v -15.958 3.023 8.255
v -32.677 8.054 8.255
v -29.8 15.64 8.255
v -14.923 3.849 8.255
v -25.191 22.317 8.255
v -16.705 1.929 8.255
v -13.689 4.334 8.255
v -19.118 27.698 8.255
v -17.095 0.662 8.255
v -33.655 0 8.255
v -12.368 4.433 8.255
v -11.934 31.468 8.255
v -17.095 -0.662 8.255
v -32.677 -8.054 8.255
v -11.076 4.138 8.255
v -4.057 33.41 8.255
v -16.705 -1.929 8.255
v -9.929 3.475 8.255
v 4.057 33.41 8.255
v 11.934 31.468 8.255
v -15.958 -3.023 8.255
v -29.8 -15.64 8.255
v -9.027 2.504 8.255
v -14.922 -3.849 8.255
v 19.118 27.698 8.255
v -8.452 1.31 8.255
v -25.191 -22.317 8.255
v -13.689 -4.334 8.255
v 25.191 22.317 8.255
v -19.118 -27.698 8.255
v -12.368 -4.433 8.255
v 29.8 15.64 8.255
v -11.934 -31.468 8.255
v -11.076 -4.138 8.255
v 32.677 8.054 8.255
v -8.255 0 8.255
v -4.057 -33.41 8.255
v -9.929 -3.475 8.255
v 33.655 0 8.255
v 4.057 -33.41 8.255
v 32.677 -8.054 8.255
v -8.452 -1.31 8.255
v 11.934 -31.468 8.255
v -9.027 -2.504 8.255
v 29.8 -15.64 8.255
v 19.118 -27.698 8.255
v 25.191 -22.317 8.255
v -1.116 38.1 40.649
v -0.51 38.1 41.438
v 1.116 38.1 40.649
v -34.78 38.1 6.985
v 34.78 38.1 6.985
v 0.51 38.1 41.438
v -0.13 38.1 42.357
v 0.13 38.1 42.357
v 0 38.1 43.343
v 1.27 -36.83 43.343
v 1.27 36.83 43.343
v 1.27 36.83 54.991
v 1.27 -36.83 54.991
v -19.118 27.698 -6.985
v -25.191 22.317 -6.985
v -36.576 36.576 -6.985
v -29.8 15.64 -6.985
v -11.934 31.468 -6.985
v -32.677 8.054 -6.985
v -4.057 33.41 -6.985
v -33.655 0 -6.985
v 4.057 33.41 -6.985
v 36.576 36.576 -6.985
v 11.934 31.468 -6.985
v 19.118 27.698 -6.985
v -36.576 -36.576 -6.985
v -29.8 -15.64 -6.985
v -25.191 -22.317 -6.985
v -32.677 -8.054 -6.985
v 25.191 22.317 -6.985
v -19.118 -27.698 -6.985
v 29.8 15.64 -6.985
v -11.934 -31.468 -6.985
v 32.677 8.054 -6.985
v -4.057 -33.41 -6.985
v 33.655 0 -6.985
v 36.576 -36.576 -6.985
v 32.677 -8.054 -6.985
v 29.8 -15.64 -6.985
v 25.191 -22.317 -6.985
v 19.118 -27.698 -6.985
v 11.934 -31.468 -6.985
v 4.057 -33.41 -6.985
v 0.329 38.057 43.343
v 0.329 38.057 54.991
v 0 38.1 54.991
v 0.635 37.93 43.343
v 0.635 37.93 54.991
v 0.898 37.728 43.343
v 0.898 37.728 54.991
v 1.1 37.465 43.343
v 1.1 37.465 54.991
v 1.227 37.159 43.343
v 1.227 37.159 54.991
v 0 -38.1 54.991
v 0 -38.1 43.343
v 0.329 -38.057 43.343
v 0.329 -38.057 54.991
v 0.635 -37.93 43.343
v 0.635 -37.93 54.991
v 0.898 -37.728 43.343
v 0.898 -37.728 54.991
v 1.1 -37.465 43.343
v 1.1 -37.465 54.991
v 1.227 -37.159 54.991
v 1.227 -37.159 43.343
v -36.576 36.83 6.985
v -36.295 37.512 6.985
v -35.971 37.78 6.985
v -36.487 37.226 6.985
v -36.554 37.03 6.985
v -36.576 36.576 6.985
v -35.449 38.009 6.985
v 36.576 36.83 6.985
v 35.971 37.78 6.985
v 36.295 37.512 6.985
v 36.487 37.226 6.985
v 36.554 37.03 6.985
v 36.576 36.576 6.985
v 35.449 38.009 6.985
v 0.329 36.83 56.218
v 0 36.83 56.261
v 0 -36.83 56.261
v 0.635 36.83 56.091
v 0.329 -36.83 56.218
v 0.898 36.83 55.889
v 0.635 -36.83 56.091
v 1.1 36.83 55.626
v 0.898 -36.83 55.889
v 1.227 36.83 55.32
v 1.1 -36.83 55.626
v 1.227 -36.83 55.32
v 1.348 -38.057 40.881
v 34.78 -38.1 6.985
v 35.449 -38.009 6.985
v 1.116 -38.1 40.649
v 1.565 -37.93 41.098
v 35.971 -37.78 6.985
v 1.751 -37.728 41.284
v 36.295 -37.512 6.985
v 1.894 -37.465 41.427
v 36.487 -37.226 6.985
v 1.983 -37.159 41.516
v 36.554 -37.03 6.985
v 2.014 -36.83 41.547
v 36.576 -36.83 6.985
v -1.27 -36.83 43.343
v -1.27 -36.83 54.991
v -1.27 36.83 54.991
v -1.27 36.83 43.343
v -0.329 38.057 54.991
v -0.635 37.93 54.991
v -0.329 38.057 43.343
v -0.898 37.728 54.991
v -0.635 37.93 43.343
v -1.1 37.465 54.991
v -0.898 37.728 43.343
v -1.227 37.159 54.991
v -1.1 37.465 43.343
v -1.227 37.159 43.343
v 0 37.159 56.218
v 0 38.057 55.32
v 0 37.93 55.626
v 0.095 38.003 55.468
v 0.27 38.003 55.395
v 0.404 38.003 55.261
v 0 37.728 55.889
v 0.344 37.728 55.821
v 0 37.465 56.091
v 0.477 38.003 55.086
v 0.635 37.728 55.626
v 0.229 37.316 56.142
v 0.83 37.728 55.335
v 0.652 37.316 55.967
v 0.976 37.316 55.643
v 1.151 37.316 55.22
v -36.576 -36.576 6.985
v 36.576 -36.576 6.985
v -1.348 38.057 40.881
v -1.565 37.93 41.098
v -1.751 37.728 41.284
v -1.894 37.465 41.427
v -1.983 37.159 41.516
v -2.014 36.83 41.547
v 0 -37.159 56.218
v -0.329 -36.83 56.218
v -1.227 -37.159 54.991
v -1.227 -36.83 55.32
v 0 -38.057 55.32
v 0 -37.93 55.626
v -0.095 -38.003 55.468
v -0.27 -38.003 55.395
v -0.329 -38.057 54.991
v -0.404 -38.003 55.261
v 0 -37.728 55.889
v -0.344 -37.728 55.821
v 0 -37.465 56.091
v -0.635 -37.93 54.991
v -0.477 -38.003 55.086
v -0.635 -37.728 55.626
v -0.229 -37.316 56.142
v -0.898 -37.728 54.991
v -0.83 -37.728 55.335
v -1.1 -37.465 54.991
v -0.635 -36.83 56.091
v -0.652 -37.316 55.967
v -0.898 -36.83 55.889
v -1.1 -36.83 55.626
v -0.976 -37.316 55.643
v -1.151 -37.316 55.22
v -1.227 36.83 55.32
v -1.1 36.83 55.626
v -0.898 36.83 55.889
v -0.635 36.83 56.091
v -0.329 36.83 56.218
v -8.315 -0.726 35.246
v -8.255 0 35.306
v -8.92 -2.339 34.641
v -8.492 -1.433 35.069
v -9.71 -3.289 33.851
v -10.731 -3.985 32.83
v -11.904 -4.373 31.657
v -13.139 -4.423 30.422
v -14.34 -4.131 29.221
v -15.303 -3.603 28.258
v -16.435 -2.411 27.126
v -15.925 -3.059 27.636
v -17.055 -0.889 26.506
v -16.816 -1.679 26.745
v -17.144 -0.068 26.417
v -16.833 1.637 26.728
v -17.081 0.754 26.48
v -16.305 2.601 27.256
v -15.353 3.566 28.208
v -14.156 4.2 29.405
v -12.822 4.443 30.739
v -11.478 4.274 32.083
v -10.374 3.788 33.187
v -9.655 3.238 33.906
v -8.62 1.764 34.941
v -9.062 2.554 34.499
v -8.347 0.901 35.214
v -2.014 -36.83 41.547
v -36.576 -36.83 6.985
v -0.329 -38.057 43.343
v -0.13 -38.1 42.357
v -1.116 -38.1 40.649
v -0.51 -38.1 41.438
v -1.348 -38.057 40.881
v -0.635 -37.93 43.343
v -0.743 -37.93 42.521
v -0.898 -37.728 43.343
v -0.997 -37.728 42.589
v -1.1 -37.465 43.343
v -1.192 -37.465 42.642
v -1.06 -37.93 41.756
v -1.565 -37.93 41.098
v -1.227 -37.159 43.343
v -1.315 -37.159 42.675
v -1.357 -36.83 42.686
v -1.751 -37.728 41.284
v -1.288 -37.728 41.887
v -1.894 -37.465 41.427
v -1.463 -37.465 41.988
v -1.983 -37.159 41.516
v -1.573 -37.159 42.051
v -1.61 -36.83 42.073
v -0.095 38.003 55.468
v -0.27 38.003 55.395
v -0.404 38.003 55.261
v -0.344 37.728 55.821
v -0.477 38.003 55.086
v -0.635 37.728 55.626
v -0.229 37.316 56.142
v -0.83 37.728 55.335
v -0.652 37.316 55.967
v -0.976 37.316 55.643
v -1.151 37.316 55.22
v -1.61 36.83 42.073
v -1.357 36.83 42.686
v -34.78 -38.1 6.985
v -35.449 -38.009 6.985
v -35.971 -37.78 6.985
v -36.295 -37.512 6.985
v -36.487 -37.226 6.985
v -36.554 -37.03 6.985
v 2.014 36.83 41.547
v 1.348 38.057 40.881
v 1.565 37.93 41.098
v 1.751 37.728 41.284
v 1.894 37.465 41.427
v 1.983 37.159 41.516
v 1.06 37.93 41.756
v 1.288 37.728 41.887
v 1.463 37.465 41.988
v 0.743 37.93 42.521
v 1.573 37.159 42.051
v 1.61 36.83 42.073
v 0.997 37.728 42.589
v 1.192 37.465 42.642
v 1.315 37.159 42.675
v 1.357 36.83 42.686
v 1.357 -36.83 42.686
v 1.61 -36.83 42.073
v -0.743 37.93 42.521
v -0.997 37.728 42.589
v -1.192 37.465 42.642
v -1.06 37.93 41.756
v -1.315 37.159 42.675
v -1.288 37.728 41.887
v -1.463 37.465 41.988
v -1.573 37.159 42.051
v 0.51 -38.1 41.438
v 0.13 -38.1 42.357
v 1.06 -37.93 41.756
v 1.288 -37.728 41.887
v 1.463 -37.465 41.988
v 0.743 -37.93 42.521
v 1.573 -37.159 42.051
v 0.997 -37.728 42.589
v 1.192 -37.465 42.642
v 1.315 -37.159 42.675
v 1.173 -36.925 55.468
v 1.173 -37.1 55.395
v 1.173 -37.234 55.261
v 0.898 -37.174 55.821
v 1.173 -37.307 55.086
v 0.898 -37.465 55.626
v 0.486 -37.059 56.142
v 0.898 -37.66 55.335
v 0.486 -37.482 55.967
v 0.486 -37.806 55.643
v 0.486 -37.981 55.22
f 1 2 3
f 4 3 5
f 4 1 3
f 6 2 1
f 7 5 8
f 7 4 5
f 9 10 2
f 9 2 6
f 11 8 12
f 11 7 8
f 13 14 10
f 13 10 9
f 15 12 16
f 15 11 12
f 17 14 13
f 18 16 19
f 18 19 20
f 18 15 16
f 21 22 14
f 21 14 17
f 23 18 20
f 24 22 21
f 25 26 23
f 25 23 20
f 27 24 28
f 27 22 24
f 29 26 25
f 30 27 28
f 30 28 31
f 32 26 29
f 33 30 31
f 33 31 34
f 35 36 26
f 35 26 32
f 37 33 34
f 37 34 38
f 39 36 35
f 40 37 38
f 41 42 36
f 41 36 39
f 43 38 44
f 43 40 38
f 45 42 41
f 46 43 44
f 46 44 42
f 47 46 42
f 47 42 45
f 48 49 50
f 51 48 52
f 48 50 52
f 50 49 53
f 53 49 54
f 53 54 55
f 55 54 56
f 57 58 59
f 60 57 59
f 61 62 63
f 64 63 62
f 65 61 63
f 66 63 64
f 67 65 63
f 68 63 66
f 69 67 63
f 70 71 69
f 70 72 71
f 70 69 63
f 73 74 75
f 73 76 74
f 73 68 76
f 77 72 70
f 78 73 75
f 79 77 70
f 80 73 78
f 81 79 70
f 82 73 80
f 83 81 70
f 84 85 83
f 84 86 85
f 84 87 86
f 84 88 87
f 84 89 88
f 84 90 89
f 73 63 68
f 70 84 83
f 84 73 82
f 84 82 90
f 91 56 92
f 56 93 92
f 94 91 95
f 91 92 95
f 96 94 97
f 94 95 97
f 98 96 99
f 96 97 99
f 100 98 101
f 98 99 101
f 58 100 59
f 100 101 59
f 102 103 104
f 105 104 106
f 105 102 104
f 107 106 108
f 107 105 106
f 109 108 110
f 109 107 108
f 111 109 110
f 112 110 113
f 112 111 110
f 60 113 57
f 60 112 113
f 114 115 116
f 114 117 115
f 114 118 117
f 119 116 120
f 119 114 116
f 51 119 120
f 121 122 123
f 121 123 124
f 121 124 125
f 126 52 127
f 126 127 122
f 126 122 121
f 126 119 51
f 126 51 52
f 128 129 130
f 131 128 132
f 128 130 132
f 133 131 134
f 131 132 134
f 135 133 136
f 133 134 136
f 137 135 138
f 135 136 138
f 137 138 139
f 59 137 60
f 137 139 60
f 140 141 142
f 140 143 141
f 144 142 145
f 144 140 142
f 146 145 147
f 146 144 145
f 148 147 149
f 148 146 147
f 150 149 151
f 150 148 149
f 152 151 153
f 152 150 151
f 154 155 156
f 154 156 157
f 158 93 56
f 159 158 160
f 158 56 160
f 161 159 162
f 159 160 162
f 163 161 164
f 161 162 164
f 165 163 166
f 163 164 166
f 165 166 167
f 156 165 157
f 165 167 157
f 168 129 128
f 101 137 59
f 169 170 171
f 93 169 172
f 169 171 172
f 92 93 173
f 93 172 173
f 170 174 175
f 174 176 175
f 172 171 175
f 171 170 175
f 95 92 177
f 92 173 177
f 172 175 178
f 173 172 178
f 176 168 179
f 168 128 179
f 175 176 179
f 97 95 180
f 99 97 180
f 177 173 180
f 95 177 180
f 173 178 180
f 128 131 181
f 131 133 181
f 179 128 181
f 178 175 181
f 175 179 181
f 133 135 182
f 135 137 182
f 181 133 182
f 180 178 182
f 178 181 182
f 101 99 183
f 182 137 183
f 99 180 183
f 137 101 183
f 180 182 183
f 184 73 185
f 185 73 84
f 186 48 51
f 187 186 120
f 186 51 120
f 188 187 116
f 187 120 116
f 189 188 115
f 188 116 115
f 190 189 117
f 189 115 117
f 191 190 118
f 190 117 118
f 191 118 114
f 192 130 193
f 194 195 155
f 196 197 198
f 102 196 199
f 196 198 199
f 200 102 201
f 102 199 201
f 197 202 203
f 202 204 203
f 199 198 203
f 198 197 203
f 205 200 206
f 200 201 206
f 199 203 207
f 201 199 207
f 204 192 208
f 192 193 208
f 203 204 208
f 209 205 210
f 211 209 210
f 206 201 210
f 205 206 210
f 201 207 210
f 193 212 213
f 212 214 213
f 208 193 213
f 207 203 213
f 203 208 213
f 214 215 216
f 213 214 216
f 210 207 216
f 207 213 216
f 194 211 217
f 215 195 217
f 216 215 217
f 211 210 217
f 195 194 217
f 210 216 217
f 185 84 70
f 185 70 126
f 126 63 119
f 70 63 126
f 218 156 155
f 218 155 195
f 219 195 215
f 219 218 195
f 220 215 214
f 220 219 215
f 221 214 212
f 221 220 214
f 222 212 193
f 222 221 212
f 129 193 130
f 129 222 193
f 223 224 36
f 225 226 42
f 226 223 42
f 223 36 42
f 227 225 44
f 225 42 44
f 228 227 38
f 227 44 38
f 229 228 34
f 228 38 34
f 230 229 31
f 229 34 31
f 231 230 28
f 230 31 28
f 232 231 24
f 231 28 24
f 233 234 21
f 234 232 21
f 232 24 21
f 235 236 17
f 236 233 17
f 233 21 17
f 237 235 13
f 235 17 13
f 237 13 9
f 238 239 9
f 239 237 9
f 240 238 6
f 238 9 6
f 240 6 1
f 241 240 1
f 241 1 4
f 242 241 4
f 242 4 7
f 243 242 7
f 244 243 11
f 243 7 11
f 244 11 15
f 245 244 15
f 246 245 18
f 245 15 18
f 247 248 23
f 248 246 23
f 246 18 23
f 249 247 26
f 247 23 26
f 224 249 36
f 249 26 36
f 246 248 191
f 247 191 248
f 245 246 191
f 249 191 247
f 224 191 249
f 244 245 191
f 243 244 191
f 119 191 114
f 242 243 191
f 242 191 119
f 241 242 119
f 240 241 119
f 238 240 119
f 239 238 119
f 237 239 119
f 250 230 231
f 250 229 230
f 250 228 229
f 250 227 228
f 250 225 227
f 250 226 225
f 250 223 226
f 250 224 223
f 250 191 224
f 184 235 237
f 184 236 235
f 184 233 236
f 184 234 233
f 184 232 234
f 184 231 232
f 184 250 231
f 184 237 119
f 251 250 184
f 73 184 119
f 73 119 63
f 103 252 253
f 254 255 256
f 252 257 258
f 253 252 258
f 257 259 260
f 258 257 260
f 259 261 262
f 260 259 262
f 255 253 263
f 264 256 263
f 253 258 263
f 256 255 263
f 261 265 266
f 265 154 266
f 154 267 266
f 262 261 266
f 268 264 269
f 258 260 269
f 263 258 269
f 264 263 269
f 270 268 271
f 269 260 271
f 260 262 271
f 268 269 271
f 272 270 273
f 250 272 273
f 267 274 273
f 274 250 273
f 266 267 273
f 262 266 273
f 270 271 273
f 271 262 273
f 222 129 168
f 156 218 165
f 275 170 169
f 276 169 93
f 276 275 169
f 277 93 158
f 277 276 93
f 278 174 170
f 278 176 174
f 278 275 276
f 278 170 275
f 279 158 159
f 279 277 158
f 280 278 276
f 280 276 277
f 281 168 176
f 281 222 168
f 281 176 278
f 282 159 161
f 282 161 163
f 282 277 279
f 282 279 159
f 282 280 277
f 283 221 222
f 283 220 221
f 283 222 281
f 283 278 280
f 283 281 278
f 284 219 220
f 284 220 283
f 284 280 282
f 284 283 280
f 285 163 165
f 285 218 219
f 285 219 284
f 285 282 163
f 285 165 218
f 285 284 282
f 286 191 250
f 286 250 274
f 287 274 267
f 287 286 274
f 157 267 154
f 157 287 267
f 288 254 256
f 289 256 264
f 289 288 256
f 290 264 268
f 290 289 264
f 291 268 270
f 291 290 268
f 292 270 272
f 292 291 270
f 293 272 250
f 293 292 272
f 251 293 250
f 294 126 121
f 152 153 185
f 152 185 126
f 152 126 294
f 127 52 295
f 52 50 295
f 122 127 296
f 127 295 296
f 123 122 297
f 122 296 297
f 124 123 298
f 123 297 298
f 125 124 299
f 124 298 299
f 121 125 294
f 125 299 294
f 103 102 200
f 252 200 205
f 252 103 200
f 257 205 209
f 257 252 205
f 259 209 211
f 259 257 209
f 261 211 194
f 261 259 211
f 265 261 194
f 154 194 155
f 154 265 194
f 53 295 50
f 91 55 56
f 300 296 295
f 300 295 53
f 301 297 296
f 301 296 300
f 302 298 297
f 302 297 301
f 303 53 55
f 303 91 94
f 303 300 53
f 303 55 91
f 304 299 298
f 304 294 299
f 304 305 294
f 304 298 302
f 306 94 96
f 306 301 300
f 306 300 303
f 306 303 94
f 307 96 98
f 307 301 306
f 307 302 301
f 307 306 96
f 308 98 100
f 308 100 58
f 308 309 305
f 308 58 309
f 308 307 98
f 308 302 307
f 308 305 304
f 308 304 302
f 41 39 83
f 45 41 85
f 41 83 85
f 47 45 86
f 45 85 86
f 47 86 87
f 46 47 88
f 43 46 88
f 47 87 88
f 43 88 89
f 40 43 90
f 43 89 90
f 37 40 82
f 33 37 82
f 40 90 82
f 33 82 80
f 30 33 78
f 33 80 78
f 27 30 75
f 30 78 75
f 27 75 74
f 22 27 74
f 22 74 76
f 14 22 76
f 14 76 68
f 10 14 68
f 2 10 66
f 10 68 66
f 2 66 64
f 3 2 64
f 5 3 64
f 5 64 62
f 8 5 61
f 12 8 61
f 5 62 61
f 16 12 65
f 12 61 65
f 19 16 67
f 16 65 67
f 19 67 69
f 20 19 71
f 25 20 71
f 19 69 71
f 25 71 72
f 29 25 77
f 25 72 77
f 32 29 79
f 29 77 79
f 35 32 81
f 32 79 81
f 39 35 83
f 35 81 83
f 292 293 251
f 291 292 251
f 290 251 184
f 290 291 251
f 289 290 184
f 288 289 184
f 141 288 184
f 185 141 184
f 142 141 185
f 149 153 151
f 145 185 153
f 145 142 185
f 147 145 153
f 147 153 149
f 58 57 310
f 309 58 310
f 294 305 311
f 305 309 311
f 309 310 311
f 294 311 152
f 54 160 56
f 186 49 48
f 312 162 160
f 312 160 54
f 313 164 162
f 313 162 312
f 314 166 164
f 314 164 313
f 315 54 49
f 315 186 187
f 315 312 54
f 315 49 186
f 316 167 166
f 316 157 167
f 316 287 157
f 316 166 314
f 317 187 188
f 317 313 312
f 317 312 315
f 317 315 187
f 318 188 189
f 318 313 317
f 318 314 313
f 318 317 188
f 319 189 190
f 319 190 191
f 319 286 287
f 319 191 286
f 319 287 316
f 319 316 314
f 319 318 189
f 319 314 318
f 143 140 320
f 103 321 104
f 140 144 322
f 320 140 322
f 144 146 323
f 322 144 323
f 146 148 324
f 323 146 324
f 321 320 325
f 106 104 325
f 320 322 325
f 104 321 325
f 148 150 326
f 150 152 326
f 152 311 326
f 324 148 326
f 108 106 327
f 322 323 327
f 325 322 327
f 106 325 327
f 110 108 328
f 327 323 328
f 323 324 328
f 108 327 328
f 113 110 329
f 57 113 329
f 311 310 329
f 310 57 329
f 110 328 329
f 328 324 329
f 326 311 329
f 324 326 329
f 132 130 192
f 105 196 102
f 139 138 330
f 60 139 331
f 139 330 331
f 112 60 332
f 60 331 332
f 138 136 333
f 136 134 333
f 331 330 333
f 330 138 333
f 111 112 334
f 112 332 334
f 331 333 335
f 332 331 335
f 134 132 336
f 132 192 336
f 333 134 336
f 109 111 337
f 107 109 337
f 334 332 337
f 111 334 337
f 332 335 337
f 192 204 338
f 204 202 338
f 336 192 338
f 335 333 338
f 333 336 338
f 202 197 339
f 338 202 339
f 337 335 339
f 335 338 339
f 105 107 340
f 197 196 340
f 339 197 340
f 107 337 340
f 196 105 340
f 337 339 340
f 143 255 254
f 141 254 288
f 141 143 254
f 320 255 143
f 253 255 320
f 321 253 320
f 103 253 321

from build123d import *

# Parameters (mm, degrees)
F1_DEPTH = 38.1
F2_W     = 73.152
F2_H     = 1.524
F3_DEPTH = 13.97
F4_R     = 4.445
F5_DEPTH = 76.2
F6_R     = 33.655
F6_R_2   = 4.445
F7_DEPTH = 15.24
F8_R     = 2.54
F9_R     = 1.26999


# Not quite as in the source:
# - a fillet or chamfer is up to 0.001 mm smaller than in the source, because OpenCascade refuses the exact size


with BuildPart() as f1:
    # F0 (on Front) → F1 (new body, symmetric)
    with BuildSketch(Plane.XZ):
        Polygon((-36.576, 6.985), (-36.576, -6.985), (36.576, -6.985), (36.576, 6.985), (1.27, 42.291), (1.27, 56.261), (0, 56.261), (-1.27, 56.261), (-1.27, 42.291), align=None)
    extrude(amount=F1_DEPTH, both=True)

    # F2 (on face) → F3 (cut)
    with BuildSketch(Plane(origin=(0, 0, -6.985), x_dir=(1, 0, 0), z_dir=(0, 0, -1))):
        with Locations((0, 37.338)):
            Rectangle(F2_W, F2_H)
        with Locations((0, -37.338)):
            Rectangle(F2_W, F2_H)
    extrude(amount=-F3_DEPTH, mode=Mode.SUBTRACT)

    # F4 (on face) → F5 (cut)
    with BuildSketch(Plane(origin=(0, 0, -6.985), x_dir=(1, 0, 0), z_dir=(0, 0, -1))):
        with Locations((-12.7, 0)):
            Circle(F4_R)
    extrude(amount=-F5_DEPTH, mode=Mode.SUBTRACT)

    # F6 (on face) → F7 (cut)
    with BuildSketch(Plane(origin=(0, 0, -6.985), x_dir=(1, 0, 0), z_dir=(0, 0, -1))):
        Circle(F6_R)
        with Locations((-12.7, 0)):
            Circle(F6_R_2, mode=Mode.SUBTRACT)
    extrude(amount=-F7_DEPTH, mode=Mode.SUBTRACT)

    # F8
    f8_edges = [f1.edges().sort_by_distance(p)[0] for p in [
        (-1.27, 0, 42.291),
        (1.27, 0, 42.291),
    ]]
    fillet(f8_edges, radius=F8_R)

    # F9 (radius 1.27 in the source; OpenCascade refuses exactly that, so slightly less here)
    f9_edges = [f1.edges().sort_by_distance(p)[0] for p in [
        (-1.27, 0, 56.261),
        (0, -38.1, 56.261),
        (1.27, 0, 56.261),
        (0, 38.1, 56.261),
        (-1.27, -38.1, 49.802051),
        (19.294974, -38.1, 24.266026),
        (1.27, -38.1, 49.802051),
        (-1.27, 38.1, 49.802051),
        (1.27, 38.1, 49.802051),
    ]]
    fillet(f9_edges, radius=F9_R)


solid = f1.part
